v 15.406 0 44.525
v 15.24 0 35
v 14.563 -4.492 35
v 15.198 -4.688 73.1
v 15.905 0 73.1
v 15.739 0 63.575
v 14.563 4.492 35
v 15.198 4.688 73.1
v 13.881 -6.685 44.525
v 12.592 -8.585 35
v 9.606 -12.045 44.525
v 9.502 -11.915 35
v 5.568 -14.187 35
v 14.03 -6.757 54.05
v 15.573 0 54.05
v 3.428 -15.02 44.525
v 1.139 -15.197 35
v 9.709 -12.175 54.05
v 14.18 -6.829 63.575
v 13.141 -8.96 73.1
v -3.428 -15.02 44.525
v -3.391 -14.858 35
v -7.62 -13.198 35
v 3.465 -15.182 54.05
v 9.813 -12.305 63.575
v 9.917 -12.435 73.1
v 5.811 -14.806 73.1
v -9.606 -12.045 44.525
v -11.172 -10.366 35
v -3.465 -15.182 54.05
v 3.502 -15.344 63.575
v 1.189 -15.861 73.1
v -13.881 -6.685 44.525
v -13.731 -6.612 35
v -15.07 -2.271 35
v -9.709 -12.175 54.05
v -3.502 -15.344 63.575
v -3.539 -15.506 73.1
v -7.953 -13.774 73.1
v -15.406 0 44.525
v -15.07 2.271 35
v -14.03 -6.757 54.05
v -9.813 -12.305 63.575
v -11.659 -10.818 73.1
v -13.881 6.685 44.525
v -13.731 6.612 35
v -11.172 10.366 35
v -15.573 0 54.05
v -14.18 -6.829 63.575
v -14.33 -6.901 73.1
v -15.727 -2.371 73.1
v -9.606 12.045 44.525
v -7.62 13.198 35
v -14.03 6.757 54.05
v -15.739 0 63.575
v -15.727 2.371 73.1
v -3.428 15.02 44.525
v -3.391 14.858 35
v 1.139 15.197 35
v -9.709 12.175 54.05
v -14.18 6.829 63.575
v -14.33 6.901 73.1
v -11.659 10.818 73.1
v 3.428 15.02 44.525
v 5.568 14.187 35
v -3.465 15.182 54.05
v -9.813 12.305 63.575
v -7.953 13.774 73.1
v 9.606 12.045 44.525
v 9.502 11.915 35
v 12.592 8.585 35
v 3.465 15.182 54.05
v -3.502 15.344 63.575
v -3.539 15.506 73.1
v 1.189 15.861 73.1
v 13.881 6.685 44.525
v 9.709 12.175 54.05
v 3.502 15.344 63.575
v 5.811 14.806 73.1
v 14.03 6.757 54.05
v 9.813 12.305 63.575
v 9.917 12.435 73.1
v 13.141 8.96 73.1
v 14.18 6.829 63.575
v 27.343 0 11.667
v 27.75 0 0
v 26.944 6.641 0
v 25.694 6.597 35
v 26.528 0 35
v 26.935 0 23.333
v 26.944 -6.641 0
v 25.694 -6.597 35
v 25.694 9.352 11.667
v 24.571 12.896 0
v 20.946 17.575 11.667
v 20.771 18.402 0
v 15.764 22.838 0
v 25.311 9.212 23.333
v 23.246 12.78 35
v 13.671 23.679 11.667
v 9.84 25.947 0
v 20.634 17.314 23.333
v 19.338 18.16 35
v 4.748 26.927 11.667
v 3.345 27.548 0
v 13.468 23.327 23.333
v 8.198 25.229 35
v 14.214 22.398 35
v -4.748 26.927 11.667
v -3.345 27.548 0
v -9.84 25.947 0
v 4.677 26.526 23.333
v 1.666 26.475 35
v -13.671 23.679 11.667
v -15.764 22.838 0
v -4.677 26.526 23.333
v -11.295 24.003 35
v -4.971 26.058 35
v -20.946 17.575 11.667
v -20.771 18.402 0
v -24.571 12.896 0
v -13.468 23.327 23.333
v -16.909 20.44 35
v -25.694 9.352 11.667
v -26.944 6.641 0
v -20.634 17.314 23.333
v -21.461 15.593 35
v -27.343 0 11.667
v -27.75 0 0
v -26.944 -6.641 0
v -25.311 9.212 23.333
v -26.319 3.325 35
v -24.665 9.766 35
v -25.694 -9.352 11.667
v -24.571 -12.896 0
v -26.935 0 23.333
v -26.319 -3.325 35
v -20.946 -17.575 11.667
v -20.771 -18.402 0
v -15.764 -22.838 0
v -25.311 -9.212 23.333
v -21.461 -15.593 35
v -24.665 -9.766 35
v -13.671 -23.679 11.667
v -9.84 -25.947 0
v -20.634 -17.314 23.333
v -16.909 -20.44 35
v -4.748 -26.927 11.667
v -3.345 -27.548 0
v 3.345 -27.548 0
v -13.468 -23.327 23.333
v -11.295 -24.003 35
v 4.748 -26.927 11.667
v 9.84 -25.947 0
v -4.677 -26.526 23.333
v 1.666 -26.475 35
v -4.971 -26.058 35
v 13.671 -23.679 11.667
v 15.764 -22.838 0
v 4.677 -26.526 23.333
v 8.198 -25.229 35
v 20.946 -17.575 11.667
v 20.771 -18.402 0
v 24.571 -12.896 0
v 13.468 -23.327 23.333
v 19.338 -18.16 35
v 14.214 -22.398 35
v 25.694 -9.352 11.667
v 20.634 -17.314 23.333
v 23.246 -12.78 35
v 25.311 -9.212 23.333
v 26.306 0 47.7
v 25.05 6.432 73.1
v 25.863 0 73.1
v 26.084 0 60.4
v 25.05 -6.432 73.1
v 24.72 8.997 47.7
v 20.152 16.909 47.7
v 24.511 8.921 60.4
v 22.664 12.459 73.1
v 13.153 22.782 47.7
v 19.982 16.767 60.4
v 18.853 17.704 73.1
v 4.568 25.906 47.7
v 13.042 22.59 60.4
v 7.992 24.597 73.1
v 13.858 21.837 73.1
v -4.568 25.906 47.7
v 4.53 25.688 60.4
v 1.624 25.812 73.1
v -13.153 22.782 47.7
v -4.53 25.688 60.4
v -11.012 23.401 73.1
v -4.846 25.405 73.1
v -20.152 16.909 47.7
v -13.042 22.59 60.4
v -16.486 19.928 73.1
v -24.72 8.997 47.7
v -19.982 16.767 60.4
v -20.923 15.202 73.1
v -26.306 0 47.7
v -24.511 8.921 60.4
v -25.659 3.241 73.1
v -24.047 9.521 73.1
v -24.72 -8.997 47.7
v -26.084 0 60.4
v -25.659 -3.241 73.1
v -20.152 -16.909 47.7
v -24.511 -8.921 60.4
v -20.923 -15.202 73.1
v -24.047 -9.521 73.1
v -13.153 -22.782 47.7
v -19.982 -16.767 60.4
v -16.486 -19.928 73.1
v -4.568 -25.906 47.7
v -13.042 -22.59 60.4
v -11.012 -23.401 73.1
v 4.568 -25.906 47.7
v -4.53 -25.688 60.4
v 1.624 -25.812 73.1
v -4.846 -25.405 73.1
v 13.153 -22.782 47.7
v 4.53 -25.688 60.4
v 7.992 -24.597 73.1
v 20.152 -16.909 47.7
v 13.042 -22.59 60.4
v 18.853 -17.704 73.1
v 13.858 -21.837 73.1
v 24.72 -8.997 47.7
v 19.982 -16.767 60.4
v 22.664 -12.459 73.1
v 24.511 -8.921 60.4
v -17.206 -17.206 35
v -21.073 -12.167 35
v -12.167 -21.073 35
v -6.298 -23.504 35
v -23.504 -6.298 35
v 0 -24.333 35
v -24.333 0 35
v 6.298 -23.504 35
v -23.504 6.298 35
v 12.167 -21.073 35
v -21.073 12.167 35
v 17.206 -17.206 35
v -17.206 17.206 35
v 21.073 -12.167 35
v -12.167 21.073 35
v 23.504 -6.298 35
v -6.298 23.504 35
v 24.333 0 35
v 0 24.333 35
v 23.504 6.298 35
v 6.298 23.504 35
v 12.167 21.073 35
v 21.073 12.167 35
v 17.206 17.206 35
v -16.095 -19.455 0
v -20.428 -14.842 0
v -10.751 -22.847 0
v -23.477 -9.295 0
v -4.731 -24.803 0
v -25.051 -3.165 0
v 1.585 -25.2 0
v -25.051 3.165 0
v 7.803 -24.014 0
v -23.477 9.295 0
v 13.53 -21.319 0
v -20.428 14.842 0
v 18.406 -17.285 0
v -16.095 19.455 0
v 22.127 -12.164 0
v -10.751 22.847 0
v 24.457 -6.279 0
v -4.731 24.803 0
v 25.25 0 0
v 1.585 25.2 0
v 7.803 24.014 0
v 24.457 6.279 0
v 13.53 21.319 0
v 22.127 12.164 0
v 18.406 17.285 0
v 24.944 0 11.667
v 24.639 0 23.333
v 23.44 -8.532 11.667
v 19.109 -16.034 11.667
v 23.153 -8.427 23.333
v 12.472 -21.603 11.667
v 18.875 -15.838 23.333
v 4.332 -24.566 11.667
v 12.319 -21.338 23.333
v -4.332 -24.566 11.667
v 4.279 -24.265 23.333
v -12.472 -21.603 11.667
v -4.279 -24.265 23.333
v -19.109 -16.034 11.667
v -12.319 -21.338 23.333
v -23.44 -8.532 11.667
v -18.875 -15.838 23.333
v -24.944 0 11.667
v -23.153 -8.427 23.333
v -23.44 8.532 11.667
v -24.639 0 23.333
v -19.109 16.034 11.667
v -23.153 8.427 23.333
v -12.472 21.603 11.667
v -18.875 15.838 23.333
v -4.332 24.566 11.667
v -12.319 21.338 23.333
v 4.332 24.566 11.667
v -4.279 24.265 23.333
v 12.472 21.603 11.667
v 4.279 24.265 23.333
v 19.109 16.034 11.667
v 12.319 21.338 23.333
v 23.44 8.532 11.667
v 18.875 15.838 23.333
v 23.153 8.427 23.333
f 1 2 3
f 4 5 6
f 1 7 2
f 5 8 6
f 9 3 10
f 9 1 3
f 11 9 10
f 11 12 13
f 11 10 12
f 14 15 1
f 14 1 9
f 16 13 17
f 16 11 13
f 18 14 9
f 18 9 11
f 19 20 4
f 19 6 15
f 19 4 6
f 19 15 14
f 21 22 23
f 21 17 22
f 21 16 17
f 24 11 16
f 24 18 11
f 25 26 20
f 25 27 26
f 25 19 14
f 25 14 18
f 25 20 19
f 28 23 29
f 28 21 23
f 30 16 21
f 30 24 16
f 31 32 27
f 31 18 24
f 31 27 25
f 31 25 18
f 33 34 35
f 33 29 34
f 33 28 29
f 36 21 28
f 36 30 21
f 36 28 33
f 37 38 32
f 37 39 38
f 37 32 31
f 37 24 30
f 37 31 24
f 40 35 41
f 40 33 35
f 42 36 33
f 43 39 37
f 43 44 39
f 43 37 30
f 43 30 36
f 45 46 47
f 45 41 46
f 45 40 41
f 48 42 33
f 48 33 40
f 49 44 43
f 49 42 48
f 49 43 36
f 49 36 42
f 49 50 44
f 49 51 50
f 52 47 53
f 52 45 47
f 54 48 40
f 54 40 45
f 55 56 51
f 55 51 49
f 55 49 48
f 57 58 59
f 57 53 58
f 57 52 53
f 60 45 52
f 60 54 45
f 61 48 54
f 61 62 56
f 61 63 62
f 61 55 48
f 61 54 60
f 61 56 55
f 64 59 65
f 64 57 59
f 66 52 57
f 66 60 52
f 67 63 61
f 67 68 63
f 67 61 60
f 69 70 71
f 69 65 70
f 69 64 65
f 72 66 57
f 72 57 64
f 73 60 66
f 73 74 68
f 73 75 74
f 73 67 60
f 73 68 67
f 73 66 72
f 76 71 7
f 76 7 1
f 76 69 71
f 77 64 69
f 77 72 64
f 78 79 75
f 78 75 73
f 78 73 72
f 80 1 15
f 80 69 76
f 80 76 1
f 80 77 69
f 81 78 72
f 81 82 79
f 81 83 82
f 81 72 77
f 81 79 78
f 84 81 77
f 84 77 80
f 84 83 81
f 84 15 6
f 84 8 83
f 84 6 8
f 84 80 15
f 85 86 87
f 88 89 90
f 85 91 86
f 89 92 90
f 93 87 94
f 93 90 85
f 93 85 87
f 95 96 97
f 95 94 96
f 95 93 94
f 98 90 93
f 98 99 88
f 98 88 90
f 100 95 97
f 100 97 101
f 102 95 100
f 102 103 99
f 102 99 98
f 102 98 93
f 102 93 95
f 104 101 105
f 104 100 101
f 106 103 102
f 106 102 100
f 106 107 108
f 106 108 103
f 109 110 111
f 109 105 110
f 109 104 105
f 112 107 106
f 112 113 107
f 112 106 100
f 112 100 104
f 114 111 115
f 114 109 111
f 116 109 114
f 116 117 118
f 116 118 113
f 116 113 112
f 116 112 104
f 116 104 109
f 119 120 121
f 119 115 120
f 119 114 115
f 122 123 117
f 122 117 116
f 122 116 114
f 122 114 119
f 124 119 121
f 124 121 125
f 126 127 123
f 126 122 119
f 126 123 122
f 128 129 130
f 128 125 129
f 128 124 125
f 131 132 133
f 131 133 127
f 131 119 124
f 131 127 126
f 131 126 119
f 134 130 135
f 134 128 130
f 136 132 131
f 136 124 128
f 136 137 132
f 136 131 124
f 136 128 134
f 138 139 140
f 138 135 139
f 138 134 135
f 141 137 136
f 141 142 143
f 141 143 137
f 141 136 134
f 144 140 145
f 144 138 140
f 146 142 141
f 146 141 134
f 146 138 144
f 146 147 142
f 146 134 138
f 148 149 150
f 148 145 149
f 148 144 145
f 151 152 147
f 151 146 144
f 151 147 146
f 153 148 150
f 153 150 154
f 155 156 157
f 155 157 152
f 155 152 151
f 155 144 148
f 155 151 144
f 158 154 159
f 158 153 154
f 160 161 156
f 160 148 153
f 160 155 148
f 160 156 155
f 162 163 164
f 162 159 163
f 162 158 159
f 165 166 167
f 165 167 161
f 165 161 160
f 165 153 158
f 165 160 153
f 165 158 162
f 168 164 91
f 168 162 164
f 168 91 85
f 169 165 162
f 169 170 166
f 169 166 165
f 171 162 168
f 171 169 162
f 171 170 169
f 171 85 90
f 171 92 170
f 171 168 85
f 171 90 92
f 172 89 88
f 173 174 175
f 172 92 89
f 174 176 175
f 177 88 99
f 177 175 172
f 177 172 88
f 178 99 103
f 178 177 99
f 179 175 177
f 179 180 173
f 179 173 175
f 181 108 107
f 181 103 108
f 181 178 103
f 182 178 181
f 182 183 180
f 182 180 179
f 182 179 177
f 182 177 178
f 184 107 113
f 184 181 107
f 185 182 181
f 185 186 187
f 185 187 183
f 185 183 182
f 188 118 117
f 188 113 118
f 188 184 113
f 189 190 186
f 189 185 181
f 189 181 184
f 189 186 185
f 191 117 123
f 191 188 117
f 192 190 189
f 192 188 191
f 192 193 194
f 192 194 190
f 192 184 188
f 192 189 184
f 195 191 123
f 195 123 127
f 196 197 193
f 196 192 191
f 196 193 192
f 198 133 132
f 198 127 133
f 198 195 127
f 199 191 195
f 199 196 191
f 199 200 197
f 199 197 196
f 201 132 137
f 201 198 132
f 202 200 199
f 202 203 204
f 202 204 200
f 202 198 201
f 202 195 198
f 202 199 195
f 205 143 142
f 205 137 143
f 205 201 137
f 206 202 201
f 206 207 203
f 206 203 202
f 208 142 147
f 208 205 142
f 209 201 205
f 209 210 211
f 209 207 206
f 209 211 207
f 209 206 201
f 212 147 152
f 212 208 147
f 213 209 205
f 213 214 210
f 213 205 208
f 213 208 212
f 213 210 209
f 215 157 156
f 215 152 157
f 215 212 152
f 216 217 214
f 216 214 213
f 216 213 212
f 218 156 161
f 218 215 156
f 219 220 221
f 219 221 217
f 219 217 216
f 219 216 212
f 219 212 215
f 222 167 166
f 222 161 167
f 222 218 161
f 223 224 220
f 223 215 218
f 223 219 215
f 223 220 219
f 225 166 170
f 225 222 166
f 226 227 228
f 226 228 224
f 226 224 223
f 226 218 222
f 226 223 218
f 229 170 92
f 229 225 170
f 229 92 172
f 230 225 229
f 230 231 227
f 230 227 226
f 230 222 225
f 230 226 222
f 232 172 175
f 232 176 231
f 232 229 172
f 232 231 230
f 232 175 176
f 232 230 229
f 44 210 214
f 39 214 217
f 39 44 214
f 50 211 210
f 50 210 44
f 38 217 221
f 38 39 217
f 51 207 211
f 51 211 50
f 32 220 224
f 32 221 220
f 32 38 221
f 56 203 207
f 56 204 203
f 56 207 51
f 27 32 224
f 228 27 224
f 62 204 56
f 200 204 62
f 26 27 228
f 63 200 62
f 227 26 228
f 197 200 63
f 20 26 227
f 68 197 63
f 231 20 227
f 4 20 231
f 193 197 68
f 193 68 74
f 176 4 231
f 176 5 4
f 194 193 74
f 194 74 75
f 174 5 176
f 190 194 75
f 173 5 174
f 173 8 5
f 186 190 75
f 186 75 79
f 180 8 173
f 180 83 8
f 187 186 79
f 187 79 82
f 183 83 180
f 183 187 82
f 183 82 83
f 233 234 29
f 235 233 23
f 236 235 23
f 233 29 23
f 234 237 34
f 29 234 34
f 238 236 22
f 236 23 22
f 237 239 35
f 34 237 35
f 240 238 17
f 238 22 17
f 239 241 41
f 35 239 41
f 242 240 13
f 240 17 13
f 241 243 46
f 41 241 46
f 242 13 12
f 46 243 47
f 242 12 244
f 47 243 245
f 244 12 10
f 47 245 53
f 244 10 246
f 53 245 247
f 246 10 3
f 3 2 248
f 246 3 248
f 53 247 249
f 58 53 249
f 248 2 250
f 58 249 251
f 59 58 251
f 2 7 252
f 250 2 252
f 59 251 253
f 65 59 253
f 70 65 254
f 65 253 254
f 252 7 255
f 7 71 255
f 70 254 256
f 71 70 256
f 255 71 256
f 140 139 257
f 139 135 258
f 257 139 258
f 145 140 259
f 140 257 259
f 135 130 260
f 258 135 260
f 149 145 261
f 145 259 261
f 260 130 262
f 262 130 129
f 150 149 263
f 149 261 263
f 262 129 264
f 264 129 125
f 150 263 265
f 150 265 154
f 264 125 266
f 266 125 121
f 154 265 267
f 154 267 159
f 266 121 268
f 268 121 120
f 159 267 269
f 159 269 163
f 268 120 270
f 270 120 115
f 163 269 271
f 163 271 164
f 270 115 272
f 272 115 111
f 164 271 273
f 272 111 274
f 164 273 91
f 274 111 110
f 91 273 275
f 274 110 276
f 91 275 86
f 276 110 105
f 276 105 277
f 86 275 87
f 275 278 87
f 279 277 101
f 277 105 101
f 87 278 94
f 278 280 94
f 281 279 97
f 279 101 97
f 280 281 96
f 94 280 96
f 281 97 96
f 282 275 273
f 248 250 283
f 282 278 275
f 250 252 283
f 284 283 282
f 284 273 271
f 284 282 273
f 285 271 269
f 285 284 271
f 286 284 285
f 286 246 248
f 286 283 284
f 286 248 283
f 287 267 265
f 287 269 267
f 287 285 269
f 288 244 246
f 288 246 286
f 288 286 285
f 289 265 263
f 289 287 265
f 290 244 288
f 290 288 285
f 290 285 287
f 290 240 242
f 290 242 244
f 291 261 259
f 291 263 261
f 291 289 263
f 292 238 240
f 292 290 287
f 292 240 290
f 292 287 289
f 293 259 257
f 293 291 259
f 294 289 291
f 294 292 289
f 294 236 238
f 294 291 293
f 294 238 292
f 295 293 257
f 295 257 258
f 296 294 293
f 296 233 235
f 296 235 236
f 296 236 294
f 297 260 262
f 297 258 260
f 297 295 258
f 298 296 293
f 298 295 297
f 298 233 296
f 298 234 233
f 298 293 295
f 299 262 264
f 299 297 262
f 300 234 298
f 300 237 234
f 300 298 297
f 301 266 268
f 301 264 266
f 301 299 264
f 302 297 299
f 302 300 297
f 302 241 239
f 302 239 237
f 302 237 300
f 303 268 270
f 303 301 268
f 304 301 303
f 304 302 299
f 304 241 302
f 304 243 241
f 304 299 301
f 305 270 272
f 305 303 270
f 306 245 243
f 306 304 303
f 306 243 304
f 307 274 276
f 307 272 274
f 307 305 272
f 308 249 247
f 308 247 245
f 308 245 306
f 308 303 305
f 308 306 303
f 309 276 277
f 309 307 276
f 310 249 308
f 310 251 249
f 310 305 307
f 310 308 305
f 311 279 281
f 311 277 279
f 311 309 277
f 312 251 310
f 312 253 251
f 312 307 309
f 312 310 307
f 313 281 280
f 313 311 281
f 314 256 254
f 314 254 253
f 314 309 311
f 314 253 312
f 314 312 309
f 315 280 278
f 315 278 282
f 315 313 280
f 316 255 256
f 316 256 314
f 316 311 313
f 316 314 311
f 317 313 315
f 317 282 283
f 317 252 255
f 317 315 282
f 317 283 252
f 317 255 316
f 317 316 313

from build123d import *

# Parameters (mm, degrees)
F0_R     = 27.75
F1_DEPTH = 35
F1_TAPER = 2
F2_R     = 25.25
F3_DEPTH = 35.001
F3_TAPER = 1.5
F4_R     = 26.5277730678
F4_R_2   = 15.24
F5_DEPTH = 38.1
F5_TAPER = 1


with BuildPart() as f1:
    # F0 (on Top) → F1 (new body)
    with BuildSketch(Plane.XY):
        Circle(F0_R)
    extrude(amount=F1_DEPTH, taper=F1_TAPER)

    # F2 (on face) → F3 (cut, through all)
    with BuildSketch(Plane(origin=(0, 0, 0), x_dir=(1, 0, 0), z_dir=(0, 0, -1))):
        Circle(F2_R)
    extrude(amount=-F3_DEPTH, taper=F3_TAPER, mode=Mode.SUBTRACT)

    # F4 (on face) → F5 (join)
    with BuildSketch(Plane.XY.offset(35)):
        Circle(F4_R)
        Circle(F4_R_2, mode=Mode.SUBTRACT)
    extrude(amount=F5_DEPTH, taper=F5_TAPER)


solid = f1.part
